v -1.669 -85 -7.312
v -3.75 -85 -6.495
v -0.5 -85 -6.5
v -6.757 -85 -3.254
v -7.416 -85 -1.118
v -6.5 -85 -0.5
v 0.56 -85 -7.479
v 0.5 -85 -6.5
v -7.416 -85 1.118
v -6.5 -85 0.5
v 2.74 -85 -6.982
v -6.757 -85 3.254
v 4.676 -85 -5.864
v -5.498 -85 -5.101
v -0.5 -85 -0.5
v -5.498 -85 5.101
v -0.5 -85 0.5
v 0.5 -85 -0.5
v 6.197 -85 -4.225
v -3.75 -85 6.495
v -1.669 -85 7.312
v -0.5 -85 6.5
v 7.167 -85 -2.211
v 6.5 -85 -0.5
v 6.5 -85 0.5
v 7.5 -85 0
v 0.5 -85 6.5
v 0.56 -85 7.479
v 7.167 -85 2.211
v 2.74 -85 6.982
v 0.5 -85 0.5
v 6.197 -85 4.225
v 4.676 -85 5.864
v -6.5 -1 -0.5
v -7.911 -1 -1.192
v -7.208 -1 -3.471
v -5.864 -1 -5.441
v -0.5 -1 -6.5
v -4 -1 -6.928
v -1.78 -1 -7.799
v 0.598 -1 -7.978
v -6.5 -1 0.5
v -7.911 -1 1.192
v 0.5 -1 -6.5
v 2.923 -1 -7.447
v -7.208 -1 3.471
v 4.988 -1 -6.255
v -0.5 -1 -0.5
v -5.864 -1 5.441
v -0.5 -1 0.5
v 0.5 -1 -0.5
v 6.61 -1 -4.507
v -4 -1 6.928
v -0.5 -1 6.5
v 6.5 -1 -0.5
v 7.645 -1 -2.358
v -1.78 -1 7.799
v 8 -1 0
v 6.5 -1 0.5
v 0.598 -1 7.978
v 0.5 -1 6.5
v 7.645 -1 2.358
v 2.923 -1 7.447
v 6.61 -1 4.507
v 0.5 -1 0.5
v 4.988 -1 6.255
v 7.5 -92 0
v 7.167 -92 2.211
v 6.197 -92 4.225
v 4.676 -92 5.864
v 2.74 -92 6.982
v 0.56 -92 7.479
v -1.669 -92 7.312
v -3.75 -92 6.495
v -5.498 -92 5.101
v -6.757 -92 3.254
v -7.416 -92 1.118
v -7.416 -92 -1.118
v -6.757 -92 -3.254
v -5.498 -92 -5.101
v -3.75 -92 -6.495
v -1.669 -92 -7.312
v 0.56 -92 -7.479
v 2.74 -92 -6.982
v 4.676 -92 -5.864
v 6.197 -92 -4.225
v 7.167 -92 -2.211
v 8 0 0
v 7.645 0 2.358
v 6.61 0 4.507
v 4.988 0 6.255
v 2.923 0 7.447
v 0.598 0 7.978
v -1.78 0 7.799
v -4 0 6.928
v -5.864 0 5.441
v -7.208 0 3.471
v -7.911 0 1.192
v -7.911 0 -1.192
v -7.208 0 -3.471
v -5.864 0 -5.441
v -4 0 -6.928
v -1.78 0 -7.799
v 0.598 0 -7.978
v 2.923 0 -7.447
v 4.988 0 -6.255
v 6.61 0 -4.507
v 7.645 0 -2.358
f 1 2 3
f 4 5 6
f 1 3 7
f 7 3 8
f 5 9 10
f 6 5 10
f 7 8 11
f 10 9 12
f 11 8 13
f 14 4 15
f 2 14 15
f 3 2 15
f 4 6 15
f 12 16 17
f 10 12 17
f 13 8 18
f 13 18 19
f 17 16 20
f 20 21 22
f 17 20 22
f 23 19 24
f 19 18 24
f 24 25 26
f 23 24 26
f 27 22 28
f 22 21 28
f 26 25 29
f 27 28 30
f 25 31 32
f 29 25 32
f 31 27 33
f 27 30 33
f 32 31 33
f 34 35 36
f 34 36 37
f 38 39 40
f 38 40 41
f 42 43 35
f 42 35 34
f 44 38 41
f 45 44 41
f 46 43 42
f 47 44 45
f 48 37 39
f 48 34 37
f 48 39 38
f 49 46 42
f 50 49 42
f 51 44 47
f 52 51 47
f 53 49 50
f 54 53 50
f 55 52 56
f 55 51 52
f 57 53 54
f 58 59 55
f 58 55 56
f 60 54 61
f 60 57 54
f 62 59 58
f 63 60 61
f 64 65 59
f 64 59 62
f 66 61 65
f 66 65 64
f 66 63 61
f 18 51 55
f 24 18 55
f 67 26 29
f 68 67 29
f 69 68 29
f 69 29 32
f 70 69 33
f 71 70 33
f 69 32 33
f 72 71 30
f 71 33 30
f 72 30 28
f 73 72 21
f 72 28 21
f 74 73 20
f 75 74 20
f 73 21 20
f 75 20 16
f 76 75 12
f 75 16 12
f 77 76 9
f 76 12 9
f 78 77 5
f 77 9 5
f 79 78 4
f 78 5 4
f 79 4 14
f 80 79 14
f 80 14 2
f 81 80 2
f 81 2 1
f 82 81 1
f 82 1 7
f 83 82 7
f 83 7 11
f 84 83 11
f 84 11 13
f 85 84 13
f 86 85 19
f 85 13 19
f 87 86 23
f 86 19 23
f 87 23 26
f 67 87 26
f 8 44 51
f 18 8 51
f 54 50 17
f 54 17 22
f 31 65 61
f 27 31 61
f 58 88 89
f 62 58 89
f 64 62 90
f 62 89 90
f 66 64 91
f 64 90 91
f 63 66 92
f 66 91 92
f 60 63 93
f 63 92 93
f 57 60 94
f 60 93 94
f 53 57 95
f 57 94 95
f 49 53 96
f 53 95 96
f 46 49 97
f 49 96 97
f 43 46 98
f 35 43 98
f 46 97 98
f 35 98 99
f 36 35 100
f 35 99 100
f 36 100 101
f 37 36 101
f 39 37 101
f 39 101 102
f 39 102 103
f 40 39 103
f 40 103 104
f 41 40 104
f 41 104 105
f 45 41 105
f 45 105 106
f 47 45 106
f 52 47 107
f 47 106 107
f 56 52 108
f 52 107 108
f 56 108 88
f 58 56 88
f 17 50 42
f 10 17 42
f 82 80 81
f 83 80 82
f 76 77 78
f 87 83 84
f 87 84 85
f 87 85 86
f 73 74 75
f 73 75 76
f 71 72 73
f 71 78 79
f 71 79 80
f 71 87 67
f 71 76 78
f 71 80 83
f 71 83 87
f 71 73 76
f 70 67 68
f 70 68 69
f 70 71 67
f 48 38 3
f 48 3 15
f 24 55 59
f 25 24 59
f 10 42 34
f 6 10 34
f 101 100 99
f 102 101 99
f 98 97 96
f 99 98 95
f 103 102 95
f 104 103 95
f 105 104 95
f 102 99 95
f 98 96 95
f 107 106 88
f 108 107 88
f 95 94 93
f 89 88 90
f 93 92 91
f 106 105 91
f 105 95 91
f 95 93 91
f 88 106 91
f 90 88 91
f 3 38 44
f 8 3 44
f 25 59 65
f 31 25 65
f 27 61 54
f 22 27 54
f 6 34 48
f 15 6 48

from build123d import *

# Parameters (mm, degrees)
F0_R     = 8
F1_DEPTH = 1
F2_W     = 6
F2_H     = 0.5
F2_W_2   = 0.5
F2_H_2   = 6
F3_DEPTH = 84
F4_R     = 7.5
F5_DEPTH = 7


with BuildPart() as f1:
    # F0 (on Front) → F1 (new body)
    with BuildSketch(Plane.XZ):
        Circle(F0_R)
    extrude(amount=F1_DEPTH)

    # F2 (on face) → F3 (join)
    with BuildSketch(Plane.XZ.offset(1)):
        with Locations((-3.5, 0.25)):
            Rectangle(F2_W, F2_H)
        with Locations((-3.5, -0.25)):
            Rectangle(F2_W, F2_H)
        with Locations((-0.25, 0.25)):
            Rectangle(F2_W_2, F2_H)
        with Locations((-0.25, -0.25)):
            Rectangle(F2_W_2, F2_H)
        with Locations((0.25, 0.25)):
            Rectangle(F2_W_2, F2_H)
        with Locations((0.25, -0.25)):
            Rectangle(F2_W_2, F2_H)
        with Locations((-0.25, -3.5)):
            Rectangle(F2_W_2, F2_H_2)
        with Locations((-0.25, 3.5)):
            Rectangle(F2_W_2, F2_H_2)
        with Locations((3.5, 0.25)):
            Rectangle(F2_W, F2_H)
        with Locations((3.5, -0.25)):
            Rectangle(F2_W, F2_H)
        with Locations((0.25, 3.5)):
            Rectangle(F2_W_2, F2_H_2)
        with Locations((0.25, -3.5)):
            Rectangle(F2_W_2, F2_H_2)
    extrude(amount=F3_DEPTH)

    # F4 (on face) → F5 (join)
    with BuildSketch(Plane.XZ.offset(85)):
        Circle(F4_R)
    extrude(amount=F5_DEPTH)


solid = f1.part
